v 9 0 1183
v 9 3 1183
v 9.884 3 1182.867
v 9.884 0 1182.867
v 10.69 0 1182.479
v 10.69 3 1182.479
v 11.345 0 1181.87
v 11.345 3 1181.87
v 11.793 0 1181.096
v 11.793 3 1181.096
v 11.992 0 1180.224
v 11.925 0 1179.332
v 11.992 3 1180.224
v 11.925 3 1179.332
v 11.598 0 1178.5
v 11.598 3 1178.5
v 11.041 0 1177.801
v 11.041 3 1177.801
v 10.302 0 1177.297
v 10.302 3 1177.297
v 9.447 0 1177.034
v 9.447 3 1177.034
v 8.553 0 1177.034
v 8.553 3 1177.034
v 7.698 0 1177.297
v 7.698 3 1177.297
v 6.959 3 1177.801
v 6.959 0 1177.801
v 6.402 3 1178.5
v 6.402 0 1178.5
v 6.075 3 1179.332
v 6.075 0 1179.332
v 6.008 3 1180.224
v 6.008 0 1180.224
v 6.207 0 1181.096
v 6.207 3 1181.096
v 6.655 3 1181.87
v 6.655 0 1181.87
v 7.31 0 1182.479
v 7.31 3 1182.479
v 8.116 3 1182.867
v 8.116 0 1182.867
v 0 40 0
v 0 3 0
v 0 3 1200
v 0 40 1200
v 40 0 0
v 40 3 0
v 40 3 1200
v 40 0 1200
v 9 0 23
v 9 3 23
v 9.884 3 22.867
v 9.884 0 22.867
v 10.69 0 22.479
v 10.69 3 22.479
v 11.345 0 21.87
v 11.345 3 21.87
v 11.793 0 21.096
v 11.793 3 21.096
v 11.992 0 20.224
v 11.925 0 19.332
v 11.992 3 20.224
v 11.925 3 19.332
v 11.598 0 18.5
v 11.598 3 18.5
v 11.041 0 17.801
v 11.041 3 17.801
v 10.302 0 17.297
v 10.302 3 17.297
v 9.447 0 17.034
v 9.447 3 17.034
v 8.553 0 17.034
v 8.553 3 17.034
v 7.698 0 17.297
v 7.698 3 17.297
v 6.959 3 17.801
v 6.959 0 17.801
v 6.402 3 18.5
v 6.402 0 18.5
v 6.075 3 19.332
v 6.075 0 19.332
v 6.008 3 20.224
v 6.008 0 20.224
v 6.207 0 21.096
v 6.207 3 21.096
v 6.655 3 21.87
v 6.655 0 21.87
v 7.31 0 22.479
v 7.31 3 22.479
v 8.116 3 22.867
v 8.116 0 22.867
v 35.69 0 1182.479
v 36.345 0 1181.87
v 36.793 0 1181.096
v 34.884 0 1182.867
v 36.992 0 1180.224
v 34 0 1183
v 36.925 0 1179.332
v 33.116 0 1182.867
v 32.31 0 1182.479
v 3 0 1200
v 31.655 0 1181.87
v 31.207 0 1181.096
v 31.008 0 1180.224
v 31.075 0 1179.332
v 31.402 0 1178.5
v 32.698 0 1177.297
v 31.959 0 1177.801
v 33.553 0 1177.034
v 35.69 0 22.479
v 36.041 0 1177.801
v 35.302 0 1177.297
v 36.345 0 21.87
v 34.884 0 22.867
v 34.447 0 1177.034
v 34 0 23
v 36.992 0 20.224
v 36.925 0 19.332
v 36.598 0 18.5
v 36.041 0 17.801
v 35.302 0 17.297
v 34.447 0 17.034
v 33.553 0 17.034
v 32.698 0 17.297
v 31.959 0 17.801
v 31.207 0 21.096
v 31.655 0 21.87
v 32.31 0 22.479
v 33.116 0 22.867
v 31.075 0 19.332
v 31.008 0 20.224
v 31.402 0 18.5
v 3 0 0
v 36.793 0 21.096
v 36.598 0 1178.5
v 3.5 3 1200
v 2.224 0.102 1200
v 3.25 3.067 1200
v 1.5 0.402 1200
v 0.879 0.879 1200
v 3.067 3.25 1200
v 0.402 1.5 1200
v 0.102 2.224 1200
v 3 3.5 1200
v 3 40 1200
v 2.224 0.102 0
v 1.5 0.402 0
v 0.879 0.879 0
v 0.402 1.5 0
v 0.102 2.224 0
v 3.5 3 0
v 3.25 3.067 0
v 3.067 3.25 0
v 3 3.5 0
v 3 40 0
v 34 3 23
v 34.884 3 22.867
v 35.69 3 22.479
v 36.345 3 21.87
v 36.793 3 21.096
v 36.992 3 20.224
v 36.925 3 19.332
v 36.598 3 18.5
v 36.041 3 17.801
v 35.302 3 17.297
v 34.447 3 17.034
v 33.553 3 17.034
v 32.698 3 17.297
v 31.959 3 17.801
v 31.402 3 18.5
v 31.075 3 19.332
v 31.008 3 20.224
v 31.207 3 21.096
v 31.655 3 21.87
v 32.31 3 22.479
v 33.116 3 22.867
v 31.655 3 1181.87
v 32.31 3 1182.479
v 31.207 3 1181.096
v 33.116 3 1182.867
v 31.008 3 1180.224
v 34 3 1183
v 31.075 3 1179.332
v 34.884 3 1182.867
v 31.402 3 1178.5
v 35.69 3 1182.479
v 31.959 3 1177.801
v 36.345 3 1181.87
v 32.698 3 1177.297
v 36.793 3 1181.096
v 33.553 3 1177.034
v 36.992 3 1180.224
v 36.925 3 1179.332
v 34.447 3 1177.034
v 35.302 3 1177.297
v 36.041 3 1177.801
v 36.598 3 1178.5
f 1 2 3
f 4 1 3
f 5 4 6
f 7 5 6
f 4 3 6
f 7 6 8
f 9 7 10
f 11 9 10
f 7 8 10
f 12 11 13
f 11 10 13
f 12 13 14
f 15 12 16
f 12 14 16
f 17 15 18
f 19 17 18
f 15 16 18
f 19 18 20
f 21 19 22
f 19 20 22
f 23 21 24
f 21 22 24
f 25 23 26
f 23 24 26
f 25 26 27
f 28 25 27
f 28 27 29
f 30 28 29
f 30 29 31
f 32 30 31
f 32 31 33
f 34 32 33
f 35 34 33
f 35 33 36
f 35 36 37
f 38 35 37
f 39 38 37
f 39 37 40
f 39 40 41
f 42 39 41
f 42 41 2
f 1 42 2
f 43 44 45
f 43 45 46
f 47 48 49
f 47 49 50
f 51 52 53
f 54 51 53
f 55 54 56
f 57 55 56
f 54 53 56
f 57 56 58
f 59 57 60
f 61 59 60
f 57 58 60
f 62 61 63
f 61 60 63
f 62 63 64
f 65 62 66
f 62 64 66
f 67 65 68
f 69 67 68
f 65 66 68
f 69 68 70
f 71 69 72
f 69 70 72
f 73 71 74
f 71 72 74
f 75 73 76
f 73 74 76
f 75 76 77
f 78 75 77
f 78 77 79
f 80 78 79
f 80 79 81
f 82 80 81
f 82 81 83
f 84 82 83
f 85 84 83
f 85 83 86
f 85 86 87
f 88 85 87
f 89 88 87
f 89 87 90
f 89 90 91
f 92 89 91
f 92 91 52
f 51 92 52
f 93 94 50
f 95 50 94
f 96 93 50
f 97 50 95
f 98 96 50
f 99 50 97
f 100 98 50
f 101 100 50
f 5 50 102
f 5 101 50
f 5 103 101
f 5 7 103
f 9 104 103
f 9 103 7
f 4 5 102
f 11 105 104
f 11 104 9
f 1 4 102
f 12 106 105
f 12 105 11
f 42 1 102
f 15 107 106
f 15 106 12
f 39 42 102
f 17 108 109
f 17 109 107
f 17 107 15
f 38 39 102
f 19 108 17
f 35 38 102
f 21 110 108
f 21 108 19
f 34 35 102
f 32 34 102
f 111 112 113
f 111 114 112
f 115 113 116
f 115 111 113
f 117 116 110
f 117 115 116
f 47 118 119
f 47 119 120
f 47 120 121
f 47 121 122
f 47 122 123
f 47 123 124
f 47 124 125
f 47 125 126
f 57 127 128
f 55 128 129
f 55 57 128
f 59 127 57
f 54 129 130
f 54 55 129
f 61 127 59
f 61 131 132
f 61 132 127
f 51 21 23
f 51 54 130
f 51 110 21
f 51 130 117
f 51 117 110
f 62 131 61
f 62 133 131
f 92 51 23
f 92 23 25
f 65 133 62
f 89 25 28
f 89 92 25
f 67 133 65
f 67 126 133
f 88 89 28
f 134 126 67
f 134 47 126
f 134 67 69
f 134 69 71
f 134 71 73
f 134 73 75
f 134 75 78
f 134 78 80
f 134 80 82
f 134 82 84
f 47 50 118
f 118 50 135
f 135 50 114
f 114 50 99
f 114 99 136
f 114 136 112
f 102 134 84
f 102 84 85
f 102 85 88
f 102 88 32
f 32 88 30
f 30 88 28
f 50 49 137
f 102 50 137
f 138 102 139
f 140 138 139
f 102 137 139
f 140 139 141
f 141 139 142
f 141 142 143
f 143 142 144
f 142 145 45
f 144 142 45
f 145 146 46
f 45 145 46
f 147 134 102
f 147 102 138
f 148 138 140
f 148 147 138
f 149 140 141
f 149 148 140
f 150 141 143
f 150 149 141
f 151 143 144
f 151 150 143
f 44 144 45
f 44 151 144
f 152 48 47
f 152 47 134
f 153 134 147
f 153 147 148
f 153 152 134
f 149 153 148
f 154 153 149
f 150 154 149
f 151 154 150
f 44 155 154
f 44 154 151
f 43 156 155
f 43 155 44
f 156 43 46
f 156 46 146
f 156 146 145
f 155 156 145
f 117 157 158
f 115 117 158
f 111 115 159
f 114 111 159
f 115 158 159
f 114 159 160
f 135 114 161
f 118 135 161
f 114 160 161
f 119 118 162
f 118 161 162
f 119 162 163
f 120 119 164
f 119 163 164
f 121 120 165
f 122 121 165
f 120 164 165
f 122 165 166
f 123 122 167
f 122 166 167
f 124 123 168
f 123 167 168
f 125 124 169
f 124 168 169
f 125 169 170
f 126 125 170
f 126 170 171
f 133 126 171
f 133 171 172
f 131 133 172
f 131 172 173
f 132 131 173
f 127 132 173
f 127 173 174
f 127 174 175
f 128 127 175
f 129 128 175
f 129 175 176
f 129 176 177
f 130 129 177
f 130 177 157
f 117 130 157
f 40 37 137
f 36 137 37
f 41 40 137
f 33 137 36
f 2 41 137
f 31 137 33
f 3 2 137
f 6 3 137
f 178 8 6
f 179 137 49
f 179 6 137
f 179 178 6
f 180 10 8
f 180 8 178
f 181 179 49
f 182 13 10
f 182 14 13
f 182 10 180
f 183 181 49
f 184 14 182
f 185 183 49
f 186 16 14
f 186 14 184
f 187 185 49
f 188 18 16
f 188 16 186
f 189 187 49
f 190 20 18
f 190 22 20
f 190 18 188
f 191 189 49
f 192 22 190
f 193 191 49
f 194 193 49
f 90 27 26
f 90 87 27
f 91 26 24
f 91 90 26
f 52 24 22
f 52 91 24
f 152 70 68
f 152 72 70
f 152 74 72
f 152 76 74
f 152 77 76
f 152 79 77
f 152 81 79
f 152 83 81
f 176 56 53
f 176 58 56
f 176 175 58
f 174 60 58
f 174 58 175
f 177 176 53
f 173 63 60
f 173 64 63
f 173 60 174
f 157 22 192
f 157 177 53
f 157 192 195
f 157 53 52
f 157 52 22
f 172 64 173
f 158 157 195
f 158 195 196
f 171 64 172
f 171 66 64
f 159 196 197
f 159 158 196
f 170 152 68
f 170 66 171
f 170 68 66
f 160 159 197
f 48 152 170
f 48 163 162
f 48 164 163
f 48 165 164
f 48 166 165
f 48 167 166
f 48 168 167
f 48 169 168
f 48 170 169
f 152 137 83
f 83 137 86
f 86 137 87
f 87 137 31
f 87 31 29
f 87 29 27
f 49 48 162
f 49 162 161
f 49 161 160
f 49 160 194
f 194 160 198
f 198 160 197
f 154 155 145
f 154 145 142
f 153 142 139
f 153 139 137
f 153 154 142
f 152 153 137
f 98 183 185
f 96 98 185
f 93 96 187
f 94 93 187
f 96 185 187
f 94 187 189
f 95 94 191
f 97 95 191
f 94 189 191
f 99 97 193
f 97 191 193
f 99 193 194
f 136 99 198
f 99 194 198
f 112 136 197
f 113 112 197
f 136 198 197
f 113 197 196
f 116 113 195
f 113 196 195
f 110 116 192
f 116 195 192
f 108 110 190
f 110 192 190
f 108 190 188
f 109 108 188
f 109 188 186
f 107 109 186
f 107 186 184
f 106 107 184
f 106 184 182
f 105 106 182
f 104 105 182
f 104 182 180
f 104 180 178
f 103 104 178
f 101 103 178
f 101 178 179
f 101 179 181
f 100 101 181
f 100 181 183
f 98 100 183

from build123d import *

# Parameters (mm, degrees)
BOSS_EXTRUDE1_DEPTH = 1200
CUT_EXTRUDE1_REACH  = 1203.236
SKETCH2_R           = 3


with BuildPart() as part:
    # Sketch1 → Boss-Extrude1 (new body)
    with BuildSketch(Plane.XY):
        with BuildLine():
            Line((0, 3), (0, 40))
            Line((0, 40), (3, 40))
            Line((3, 40), (3, 3.5))
            ThreePointArc((3, 3.5), (3.146446609, 3.146446609), (3.5, 3))
            Line((3.5, 3), (40, 3))
            Line((40, 3), (40, 0))
            Line((40, 0), (3, 0))
            ThreePointArc((3, 0), (0.878679656, 0.878679656), (0, 3))
        make_face()
    extrude(amount=BOSS_EXTRUDE1_DEPTH)

    # Sketch2 → Cut-Extrude1 (cut, up to next)
    with BuildSketch(Plane(origin=(0, 3, 0), x_dir=(1, 0, 0), z_dir=(0, 1, 0)), mode=Mode.PRIVATE) as cut_extrude1_sk1:
        with Locations(Location((9, -1180, 0), (0, 0, 270))):
            Circle(SKETCH2_R)
    cut_extrude1_tool1 = extrude(cut_extrude1_sk1.sketch, amount=-CUT_EXTRUDE1_REACH, mode=Mode.PRIVATE) & part.part
    # Sketch2 → Cut-Extrude1 (cut, up to next)
    with BuildSketch(Plane(origin=(0, 3, 0), x_dir=(1, 0, 0), z_dir=(0, 1, 0)), mode=Mode.PRIVATE) as cut_extrude1_sk2:
        with Locations(Location((34, -1180, 0), (0, 0, 270))):
            Circle(SKETCH2_R)
    cut_extrude1_tool2 = extrude(cut_extrude1_sk2.sketch, amount=-CUT_EXTRUDE1_REACH, mode=Mode.PRIVATE) & part.part
    # Sketch2 → Cut-Extrude1 (cut, up to next)
    with BuildSketch(Plane(origin=(0, 3, 0), x_dir=(1, 0, 0), z_dir=(0, 1, 0)), mode=Mode.PRIVATE) as cut_extrude1_sk3:
        with Locations(Location((9, -20, 0), (0, 0, 270))):
            Circle(SKETCH2_R)
    cut_extrude1_tool3 = extrude(cut_extrude1_sk3.sketch, amount=-CUT_EXTRUDE1_REACH, mode=Mode.PRIVATE) & part.part
    # Sketch2 → Cut-Extrude1 (cut, up to next)
    with BuildSketch(Plane(origin=(0, 3, 0), x_dir=(1, 0, 0), z_dir=(0, 1, 0)), mode=Mode.PRIVATE) as cut_extrude1_sk4:
        with Locations(Location((34, -20, 0), (0, 0, 270))):
            Circle(SKETCH2_R)
    cut_extrude1_tool4 = extrude(cut_extrude1_sk4.sketch, amount=-CUT_EXTRUDE1_REACH, mode=Mode.PRIVATE) & part.part
    add(cut_extrude1_tool1.solids().sort_by_distance((9, 3, 1180))[0], mode=Mode.SUBTRACT)
    add(cut_extrude1_tool2.solids().sort_by_distance((34, 3, 1180))[0], mode=Mode.SUBTRACT)
    add(cut_extrude1_tool3.solids().sort_by_distance((9, 3, 20))[0], mode=Mode.SUBTRACT)
    add(cut_extrude1_tool4.solids().sort_by_distance((34, 3, 20))[0], mode=Mode.SUBTRACT)


solid = part.part
